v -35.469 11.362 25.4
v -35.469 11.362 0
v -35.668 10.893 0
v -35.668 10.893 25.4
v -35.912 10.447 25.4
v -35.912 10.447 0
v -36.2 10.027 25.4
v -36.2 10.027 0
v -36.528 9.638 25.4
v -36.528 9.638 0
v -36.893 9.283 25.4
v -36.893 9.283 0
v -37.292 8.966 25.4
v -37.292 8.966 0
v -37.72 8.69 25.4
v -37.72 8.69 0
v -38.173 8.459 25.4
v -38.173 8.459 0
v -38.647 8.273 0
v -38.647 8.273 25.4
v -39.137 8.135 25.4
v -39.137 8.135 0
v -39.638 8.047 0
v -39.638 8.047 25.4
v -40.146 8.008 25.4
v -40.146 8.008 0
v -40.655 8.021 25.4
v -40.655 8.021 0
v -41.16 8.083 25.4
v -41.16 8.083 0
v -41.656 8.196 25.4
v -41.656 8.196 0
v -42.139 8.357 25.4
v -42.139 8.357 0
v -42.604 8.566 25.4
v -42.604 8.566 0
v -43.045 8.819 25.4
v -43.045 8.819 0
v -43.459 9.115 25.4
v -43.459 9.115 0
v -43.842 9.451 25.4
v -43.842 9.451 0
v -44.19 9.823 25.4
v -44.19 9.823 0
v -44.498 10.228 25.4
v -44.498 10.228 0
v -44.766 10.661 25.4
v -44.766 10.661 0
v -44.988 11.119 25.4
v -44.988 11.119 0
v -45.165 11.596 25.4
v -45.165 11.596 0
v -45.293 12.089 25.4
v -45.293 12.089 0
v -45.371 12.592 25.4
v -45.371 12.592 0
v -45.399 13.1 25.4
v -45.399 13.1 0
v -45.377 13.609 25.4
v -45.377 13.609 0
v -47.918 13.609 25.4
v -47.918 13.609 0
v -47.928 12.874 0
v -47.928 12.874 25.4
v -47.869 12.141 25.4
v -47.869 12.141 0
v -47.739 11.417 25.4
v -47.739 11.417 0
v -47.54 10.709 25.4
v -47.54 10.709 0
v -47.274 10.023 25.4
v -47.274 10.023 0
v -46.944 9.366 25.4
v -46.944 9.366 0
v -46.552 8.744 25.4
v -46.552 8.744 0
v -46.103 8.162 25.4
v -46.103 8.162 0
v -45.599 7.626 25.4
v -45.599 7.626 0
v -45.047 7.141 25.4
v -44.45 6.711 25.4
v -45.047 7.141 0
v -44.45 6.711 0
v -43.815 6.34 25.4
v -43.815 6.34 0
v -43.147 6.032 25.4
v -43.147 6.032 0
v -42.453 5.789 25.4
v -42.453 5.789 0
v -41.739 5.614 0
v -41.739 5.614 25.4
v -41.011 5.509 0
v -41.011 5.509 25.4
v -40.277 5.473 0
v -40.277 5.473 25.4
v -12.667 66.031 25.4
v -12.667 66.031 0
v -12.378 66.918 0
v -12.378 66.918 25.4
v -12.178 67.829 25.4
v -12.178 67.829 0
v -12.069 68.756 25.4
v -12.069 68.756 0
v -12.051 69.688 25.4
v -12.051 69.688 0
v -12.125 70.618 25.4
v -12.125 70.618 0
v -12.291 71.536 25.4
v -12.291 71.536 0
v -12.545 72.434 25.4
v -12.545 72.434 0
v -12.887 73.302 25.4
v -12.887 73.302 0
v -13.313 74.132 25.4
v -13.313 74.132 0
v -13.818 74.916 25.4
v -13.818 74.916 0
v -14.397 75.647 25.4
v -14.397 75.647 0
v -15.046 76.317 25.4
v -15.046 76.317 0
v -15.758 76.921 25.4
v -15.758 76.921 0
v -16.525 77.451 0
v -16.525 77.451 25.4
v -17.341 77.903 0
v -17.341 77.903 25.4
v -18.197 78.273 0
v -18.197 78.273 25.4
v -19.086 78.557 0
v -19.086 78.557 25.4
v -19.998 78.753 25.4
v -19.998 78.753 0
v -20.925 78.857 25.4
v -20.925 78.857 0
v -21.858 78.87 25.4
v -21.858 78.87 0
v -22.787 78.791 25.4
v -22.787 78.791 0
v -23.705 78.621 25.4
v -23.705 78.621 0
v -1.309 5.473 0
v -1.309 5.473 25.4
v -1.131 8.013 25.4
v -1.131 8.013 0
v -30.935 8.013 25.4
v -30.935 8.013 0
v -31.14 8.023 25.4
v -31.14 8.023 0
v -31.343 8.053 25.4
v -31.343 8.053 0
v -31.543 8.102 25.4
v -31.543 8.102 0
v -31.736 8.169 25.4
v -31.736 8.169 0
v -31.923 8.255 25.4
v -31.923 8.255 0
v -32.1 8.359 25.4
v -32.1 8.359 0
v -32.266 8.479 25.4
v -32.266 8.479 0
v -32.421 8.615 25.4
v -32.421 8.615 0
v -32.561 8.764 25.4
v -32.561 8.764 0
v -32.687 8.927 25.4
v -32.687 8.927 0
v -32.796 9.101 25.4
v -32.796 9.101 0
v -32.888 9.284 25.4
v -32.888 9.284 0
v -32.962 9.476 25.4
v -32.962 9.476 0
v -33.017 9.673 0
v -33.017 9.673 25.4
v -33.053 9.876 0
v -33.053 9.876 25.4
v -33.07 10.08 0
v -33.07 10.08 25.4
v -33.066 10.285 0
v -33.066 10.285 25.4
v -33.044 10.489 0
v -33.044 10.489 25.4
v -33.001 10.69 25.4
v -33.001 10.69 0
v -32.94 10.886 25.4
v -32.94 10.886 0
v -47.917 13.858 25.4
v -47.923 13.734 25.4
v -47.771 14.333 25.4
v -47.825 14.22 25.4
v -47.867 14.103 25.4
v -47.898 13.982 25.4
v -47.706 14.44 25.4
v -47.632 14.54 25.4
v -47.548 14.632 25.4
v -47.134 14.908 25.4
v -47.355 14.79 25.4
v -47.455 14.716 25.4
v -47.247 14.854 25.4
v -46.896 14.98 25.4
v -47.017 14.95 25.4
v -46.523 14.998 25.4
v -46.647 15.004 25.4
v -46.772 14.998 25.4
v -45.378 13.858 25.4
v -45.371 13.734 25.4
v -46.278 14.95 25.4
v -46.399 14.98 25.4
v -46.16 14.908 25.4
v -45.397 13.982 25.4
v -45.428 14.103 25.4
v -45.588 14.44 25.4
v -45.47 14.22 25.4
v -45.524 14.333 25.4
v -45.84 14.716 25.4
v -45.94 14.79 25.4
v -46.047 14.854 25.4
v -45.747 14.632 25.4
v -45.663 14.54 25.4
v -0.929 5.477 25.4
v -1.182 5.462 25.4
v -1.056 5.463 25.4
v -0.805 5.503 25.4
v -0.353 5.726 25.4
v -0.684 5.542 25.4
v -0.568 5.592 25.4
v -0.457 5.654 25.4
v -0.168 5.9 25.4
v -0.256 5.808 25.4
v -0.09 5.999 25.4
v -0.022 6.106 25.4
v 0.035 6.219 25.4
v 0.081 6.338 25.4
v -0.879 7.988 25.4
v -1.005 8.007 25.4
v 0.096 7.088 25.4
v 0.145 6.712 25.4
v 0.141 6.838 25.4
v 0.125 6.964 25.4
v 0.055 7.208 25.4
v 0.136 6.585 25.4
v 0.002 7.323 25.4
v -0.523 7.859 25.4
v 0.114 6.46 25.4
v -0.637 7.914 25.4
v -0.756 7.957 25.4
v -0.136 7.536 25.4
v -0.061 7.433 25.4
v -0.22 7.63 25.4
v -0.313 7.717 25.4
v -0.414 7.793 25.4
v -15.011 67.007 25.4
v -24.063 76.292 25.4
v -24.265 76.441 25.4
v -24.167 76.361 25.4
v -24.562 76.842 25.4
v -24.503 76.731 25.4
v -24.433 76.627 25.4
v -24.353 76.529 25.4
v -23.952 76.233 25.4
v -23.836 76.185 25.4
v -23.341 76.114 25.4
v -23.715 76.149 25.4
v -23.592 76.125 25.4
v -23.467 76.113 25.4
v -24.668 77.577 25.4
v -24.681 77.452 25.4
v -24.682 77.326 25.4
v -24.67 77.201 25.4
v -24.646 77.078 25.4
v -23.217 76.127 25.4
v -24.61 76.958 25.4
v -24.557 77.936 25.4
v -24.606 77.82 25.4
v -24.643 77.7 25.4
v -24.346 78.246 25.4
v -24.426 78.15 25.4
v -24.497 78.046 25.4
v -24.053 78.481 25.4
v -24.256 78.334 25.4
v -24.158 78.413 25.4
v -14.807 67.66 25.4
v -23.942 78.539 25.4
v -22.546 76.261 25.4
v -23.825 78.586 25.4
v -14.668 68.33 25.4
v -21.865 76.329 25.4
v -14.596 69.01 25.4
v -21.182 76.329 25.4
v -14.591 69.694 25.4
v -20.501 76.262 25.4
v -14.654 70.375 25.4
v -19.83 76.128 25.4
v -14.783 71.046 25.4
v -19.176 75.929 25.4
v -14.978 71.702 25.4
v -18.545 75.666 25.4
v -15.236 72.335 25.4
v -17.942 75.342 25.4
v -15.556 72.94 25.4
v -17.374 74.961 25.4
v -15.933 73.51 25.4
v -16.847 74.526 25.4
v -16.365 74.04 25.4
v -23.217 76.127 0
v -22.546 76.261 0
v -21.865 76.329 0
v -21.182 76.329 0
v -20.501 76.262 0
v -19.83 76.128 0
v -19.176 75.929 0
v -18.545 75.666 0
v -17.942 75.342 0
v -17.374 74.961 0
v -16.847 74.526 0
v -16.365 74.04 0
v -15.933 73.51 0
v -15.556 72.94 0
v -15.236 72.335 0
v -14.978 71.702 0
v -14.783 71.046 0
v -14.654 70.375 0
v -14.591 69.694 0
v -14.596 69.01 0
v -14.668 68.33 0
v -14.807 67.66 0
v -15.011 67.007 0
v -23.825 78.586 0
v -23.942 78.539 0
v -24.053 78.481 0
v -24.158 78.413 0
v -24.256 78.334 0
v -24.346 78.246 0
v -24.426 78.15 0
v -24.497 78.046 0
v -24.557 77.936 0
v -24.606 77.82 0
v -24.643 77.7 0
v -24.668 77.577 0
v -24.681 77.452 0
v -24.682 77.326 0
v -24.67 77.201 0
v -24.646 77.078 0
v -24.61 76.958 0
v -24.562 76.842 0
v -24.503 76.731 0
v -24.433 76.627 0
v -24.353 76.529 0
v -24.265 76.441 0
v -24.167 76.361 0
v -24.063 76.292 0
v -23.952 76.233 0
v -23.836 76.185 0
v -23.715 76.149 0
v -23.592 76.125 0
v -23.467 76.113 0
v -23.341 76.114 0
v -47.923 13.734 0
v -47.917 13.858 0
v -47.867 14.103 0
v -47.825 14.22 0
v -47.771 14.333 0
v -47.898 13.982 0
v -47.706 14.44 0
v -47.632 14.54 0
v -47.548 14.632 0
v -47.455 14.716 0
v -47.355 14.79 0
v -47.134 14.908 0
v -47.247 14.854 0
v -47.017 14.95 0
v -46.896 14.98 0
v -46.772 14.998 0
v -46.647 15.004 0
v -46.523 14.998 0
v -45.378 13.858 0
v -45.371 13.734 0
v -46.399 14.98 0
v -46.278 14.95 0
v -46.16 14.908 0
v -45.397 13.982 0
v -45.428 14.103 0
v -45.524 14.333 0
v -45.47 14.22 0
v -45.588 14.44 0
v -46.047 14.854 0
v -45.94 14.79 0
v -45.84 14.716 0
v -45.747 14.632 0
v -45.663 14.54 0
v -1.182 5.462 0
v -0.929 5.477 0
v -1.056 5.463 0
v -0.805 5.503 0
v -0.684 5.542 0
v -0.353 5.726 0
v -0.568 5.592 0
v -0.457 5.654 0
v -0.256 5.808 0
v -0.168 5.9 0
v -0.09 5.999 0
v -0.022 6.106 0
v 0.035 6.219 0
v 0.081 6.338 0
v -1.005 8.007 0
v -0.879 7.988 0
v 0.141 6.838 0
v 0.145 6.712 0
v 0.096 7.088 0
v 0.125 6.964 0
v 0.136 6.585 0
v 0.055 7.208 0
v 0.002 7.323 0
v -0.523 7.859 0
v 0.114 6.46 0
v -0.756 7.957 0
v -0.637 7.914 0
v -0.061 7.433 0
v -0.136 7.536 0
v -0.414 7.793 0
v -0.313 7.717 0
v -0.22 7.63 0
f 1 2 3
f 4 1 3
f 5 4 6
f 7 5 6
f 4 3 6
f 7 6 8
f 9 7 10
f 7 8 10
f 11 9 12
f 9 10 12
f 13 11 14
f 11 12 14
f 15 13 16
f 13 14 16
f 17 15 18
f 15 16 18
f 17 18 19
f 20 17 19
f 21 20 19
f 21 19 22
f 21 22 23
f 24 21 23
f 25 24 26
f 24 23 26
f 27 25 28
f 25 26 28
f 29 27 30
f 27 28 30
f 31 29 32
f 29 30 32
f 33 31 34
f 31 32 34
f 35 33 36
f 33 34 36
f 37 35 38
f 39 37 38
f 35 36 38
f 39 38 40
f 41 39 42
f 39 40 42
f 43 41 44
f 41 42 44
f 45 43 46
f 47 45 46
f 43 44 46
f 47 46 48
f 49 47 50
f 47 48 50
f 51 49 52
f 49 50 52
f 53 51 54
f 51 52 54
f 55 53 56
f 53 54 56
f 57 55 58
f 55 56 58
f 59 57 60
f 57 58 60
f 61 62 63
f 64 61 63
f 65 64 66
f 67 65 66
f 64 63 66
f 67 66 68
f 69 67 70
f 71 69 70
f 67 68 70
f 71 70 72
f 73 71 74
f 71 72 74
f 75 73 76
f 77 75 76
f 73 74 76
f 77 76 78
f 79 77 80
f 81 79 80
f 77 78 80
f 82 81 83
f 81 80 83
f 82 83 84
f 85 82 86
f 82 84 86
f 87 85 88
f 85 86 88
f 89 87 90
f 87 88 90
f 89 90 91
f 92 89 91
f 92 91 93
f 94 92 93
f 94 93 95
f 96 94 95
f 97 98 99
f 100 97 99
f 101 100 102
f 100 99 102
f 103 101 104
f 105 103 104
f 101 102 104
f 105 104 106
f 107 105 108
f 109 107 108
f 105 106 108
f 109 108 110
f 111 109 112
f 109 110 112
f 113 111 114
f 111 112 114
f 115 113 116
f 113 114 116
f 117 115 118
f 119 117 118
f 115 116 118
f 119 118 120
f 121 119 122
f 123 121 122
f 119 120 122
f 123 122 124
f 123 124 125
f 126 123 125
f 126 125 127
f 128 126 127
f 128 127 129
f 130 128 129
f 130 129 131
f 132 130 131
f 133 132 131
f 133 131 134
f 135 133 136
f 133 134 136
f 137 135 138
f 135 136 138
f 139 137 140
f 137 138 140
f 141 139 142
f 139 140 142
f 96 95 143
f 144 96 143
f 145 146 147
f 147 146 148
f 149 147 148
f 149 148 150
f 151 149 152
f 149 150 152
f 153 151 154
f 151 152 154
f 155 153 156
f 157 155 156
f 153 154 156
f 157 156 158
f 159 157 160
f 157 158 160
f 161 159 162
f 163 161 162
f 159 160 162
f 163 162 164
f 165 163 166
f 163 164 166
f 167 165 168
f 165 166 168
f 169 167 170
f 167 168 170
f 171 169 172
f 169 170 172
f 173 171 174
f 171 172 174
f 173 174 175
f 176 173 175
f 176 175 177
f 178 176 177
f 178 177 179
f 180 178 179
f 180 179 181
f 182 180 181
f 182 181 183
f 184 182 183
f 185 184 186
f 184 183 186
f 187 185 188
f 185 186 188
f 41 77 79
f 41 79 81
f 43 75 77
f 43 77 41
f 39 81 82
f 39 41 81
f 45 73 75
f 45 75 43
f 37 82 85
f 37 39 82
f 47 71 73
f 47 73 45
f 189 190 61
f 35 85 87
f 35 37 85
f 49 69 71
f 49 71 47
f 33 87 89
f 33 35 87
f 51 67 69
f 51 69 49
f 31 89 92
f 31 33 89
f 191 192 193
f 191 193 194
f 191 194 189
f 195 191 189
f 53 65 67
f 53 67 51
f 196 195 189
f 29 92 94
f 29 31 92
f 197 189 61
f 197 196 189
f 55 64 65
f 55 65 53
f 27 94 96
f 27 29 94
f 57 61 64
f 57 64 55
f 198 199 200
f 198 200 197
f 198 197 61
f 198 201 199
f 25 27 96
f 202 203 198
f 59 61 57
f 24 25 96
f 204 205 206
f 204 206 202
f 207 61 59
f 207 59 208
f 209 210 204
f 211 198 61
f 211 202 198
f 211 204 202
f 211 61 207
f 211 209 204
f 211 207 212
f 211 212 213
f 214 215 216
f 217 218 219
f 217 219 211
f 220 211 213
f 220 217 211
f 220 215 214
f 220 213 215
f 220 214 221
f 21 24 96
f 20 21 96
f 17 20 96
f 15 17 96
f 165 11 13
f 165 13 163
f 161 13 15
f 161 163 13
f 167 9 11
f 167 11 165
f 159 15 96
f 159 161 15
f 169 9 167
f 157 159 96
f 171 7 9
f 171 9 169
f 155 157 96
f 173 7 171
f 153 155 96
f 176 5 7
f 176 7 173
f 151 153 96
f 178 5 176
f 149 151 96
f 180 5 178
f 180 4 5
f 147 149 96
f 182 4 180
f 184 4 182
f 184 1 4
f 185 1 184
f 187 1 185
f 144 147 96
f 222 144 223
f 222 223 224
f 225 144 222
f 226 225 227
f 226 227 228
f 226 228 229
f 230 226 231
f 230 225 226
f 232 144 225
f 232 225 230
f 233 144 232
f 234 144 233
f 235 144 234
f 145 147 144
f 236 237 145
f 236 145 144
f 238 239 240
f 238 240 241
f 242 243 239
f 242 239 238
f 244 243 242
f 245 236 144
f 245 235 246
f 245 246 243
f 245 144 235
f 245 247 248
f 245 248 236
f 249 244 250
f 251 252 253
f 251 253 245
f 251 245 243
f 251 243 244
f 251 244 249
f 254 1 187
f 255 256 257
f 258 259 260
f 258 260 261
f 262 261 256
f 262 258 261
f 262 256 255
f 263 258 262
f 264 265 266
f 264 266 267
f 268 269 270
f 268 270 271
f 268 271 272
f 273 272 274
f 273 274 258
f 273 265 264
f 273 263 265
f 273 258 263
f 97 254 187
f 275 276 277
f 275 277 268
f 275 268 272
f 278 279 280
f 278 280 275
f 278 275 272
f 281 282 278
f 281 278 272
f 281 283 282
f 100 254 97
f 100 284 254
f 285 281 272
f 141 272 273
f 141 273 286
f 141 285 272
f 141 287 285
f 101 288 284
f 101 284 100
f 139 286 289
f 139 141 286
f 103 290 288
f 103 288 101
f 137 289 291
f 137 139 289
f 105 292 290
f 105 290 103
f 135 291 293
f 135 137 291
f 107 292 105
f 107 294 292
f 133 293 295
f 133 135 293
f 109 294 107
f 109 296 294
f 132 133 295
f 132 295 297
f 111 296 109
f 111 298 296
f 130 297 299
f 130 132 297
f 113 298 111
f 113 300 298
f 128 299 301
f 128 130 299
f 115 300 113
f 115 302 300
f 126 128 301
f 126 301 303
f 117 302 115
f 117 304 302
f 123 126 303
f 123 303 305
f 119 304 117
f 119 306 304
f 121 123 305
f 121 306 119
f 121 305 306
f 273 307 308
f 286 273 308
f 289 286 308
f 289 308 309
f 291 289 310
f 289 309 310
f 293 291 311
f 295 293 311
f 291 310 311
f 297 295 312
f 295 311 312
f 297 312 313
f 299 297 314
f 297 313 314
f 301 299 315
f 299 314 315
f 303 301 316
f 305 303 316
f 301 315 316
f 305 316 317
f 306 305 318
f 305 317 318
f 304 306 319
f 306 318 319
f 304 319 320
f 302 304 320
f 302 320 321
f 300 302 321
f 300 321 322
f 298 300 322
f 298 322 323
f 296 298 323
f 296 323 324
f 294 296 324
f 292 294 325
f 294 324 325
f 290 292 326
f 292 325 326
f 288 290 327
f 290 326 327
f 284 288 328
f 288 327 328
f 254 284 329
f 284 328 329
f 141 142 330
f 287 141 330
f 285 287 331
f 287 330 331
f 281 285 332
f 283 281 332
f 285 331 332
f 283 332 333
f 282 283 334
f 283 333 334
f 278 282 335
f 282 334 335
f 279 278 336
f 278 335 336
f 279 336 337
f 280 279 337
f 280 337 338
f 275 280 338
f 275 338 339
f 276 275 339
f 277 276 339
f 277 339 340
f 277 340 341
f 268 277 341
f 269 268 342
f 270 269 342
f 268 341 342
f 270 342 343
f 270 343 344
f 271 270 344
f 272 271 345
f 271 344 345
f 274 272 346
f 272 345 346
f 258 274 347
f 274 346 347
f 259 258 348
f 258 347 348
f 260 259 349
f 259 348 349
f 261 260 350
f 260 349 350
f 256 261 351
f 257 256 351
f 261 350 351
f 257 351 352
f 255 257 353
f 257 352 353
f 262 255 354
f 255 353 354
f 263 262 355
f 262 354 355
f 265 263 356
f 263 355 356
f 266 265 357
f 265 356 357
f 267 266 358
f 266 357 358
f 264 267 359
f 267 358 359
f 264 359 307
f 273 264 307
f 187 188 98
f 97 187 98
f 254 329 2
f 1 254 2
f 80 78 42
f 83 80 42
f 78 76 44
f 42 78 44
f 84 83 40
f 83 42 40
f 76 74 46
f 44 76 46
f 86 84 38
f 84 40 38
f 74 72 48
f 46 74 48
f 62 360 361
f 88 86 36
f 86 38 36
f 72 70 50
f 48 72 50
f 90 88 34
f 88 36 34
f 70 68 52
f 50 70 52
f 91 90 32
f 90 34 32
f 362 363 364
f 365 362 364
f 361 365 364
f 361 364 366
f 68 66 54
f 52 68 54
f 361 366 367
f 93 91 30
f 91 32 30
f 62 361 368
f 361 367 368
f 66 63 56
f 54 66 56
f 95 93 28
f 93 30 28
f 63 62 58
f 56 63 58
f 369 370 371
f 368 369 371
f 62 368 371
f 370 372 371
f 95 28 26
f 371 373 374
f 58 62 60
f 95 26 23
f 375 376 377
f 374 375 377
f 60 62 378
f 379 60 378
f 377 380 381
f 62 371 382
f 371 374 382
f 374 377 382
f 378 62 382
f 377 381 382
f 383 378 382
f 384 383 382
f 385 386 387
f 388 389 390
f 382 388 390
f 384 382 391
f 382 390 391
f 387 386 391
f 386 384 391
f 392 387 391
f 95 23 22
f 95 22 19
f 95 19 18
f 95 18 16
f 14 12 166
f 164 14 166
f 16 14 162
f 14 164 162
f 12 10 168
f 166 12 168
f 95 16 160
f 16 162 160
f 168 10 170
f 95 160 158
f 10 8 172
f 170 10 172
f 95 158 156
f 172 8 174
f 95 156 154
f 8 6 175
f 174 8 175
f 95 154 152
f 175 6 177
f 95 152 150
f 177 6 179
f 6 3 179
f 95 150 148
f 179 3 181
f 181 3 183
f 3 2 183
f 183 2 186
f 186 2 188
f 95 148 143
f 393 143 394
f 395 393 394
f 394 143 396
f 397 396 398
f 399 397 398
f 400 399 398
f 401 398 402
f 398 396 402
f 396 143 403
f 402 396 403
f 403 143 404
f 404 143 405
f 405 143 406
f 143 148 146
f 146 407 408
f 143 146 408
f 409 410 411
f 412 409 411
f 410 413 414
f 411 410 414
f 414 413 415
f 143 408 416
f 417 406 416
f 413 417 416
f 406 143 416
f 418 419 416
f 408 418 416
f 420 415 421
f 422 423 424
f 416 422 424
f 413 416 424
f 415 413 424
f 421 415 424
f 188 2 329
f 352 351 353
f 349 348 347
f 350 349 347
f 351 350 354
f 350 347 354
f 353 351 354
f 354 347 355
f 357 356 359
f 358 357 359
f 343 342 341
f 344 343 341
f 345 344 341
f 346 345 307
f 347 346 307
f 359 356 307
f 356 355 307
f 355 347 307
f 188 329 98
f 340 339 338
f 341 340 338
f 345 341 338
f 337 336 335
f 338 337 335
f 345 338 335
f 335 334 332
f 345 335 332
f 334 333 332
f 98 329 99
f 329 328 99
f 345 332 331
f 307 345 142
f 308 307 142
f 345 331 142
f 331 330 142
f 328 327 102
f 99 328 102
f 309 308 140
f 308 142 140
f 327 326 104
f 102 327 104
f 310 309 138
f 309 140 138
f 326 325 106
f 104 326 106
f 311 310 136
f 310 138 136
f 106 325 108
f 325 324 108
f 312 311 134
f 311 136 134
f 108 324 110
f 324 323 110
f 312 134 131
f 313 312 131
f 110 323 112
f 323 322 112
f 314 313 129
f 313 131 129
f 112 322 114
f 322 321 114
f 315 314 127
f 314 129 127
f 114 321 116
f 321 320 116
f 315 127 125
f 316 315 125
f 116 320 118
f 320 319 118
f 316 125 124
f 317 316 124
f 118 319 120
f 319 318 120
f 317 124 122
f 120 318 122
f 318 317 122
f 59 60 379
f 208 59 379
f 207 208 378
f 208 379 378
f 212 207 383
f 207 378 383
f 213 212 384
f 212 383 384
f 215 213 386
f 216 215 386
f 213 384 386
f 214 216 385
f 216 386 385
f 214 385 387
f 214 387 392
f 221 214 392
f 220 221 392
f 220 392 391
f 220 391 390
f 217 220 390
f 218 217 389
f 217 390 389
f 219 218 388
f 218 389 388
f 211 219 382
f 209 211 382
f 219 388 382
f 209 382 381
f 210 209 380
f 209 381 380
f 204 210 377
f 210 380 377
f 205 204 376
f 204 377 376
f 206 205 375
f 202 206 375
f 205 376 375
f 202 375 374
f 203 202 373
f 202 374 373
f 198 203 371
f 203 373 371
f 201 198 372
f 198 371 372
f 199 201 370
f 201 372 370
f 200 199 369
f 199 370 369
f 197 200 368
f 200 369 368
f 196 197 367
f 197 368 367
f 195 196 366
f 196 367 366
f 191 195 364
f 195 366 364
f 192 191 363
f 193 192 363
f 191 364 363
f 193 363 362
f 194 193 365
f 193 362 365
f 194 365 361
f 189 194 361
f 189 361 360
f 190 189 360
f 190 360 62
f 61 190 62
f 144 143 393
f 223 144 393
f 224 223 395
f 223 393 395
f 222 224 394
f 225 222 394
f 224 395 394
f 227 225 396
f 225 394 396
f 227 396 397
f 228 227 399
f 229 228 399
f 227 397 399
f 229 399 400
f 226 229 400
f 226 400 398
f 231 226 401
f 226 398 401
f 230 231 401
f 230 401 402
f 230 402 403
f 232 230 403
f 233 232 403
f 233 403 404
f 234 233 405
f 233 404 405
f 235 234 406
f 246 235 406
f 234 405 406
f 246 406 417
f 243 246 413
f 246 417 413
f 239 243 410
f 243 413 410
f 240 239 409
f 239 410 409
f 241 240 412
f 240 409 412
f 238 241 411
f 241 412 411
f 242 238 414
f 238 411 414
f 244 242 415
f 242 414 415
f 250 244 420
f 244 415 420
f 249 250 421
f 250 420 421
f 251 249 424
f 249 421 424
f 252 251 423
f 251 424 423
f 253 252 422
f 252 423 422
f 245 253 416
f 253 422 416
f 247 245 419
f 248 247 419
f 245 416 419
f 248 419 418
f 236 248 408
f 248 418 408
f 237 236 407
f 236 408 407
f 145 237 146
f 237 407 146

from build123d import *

# Parameters (mm, degrees)
F1_DEPTH = 25.4


with BuildPart() as f1:
    # F0 (on Top) → F1 (new body)
    with BuildSketch(Plane.XY):
        with BuildLine():
            ThreePointArc((-47.917716, 13.608789), (-45.857251, 7.887993), (-40.276696, 5.473362))
            Line((-40.276696, 5.473362), (-1.308659, 5.473362))
            ThreePointArc((-1.308659, 5.473362), (0.14184, 6.648248), (-1.131254, 8.013362))
            Line((-1.131254, 8.013362), (-30.934975, 8.013362))
            ThreePointArc((-30.934975, 8.013362), (-32.686526, 8.926962), (-32.939632, 10.886179))
            Line((-32.939632, 10.886179), (-12.666556, 66.03077))
            ThreePointArc((-12.666556, 66.03077), (-14.397306, 75.64713), (-23.704619, 78.620983))
            ThreePointArc((-23.704619, 78.620983), (-24.659504, 77.139495), (-23.216566, 76.127298))
            ThreePointArc((-23.216566, 76.127298), (-16.365183, 74.040443), (-15.011284, 67.007424))
            Line((-15.011284, 67.007424), (-35.468568, 11.361769))
            ThreePointArc((-35.468568, 11.361769), (-41.409662, 8.133505), (-45.376973, 13.608789))
            ThreePointArc((-45.376973, 13.608789), (-46.647345, 15.004164), (-47.917716, 13.608789))
        make_face()
    extrude(amount=F1_DEPTH)


solid = f1.part
